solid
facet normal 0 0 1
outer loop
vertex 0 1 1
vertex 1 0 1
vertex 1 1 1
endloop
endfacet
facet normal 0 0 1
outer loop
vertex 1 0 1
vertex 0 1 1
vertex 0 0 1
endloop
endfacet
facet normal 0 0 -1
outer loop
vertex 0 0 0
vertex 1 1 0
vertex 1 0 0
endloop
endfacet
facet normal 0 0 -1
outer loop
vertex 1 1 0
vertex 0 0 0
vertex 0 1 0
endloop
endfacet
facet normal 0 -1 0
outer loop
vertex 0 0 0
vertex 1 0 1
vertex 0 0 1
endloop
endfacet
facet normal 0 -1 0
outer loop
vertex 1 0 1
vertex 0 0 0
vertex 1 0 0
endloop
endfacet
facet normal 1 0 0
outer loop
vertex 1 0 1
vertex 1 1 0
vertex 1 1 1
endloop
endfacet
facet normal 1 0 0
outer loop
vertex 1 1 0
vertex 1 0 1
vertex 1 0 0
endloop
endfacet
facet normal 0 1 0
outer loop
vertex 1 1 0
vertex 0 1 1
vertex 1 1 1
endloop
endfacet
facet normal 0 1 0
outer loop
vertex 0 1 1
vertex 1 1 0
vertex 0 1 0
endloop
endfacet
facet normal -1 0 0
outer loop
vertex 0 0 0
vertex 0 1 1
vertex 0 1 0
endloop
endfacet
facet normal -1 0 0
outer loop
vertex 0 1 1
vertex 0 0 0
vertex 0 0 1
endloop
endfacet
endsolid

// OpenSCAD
// negative: three backticks inside a comment (would end the code block early)
// expect-reject-line: 3
cube(1); // done ```
